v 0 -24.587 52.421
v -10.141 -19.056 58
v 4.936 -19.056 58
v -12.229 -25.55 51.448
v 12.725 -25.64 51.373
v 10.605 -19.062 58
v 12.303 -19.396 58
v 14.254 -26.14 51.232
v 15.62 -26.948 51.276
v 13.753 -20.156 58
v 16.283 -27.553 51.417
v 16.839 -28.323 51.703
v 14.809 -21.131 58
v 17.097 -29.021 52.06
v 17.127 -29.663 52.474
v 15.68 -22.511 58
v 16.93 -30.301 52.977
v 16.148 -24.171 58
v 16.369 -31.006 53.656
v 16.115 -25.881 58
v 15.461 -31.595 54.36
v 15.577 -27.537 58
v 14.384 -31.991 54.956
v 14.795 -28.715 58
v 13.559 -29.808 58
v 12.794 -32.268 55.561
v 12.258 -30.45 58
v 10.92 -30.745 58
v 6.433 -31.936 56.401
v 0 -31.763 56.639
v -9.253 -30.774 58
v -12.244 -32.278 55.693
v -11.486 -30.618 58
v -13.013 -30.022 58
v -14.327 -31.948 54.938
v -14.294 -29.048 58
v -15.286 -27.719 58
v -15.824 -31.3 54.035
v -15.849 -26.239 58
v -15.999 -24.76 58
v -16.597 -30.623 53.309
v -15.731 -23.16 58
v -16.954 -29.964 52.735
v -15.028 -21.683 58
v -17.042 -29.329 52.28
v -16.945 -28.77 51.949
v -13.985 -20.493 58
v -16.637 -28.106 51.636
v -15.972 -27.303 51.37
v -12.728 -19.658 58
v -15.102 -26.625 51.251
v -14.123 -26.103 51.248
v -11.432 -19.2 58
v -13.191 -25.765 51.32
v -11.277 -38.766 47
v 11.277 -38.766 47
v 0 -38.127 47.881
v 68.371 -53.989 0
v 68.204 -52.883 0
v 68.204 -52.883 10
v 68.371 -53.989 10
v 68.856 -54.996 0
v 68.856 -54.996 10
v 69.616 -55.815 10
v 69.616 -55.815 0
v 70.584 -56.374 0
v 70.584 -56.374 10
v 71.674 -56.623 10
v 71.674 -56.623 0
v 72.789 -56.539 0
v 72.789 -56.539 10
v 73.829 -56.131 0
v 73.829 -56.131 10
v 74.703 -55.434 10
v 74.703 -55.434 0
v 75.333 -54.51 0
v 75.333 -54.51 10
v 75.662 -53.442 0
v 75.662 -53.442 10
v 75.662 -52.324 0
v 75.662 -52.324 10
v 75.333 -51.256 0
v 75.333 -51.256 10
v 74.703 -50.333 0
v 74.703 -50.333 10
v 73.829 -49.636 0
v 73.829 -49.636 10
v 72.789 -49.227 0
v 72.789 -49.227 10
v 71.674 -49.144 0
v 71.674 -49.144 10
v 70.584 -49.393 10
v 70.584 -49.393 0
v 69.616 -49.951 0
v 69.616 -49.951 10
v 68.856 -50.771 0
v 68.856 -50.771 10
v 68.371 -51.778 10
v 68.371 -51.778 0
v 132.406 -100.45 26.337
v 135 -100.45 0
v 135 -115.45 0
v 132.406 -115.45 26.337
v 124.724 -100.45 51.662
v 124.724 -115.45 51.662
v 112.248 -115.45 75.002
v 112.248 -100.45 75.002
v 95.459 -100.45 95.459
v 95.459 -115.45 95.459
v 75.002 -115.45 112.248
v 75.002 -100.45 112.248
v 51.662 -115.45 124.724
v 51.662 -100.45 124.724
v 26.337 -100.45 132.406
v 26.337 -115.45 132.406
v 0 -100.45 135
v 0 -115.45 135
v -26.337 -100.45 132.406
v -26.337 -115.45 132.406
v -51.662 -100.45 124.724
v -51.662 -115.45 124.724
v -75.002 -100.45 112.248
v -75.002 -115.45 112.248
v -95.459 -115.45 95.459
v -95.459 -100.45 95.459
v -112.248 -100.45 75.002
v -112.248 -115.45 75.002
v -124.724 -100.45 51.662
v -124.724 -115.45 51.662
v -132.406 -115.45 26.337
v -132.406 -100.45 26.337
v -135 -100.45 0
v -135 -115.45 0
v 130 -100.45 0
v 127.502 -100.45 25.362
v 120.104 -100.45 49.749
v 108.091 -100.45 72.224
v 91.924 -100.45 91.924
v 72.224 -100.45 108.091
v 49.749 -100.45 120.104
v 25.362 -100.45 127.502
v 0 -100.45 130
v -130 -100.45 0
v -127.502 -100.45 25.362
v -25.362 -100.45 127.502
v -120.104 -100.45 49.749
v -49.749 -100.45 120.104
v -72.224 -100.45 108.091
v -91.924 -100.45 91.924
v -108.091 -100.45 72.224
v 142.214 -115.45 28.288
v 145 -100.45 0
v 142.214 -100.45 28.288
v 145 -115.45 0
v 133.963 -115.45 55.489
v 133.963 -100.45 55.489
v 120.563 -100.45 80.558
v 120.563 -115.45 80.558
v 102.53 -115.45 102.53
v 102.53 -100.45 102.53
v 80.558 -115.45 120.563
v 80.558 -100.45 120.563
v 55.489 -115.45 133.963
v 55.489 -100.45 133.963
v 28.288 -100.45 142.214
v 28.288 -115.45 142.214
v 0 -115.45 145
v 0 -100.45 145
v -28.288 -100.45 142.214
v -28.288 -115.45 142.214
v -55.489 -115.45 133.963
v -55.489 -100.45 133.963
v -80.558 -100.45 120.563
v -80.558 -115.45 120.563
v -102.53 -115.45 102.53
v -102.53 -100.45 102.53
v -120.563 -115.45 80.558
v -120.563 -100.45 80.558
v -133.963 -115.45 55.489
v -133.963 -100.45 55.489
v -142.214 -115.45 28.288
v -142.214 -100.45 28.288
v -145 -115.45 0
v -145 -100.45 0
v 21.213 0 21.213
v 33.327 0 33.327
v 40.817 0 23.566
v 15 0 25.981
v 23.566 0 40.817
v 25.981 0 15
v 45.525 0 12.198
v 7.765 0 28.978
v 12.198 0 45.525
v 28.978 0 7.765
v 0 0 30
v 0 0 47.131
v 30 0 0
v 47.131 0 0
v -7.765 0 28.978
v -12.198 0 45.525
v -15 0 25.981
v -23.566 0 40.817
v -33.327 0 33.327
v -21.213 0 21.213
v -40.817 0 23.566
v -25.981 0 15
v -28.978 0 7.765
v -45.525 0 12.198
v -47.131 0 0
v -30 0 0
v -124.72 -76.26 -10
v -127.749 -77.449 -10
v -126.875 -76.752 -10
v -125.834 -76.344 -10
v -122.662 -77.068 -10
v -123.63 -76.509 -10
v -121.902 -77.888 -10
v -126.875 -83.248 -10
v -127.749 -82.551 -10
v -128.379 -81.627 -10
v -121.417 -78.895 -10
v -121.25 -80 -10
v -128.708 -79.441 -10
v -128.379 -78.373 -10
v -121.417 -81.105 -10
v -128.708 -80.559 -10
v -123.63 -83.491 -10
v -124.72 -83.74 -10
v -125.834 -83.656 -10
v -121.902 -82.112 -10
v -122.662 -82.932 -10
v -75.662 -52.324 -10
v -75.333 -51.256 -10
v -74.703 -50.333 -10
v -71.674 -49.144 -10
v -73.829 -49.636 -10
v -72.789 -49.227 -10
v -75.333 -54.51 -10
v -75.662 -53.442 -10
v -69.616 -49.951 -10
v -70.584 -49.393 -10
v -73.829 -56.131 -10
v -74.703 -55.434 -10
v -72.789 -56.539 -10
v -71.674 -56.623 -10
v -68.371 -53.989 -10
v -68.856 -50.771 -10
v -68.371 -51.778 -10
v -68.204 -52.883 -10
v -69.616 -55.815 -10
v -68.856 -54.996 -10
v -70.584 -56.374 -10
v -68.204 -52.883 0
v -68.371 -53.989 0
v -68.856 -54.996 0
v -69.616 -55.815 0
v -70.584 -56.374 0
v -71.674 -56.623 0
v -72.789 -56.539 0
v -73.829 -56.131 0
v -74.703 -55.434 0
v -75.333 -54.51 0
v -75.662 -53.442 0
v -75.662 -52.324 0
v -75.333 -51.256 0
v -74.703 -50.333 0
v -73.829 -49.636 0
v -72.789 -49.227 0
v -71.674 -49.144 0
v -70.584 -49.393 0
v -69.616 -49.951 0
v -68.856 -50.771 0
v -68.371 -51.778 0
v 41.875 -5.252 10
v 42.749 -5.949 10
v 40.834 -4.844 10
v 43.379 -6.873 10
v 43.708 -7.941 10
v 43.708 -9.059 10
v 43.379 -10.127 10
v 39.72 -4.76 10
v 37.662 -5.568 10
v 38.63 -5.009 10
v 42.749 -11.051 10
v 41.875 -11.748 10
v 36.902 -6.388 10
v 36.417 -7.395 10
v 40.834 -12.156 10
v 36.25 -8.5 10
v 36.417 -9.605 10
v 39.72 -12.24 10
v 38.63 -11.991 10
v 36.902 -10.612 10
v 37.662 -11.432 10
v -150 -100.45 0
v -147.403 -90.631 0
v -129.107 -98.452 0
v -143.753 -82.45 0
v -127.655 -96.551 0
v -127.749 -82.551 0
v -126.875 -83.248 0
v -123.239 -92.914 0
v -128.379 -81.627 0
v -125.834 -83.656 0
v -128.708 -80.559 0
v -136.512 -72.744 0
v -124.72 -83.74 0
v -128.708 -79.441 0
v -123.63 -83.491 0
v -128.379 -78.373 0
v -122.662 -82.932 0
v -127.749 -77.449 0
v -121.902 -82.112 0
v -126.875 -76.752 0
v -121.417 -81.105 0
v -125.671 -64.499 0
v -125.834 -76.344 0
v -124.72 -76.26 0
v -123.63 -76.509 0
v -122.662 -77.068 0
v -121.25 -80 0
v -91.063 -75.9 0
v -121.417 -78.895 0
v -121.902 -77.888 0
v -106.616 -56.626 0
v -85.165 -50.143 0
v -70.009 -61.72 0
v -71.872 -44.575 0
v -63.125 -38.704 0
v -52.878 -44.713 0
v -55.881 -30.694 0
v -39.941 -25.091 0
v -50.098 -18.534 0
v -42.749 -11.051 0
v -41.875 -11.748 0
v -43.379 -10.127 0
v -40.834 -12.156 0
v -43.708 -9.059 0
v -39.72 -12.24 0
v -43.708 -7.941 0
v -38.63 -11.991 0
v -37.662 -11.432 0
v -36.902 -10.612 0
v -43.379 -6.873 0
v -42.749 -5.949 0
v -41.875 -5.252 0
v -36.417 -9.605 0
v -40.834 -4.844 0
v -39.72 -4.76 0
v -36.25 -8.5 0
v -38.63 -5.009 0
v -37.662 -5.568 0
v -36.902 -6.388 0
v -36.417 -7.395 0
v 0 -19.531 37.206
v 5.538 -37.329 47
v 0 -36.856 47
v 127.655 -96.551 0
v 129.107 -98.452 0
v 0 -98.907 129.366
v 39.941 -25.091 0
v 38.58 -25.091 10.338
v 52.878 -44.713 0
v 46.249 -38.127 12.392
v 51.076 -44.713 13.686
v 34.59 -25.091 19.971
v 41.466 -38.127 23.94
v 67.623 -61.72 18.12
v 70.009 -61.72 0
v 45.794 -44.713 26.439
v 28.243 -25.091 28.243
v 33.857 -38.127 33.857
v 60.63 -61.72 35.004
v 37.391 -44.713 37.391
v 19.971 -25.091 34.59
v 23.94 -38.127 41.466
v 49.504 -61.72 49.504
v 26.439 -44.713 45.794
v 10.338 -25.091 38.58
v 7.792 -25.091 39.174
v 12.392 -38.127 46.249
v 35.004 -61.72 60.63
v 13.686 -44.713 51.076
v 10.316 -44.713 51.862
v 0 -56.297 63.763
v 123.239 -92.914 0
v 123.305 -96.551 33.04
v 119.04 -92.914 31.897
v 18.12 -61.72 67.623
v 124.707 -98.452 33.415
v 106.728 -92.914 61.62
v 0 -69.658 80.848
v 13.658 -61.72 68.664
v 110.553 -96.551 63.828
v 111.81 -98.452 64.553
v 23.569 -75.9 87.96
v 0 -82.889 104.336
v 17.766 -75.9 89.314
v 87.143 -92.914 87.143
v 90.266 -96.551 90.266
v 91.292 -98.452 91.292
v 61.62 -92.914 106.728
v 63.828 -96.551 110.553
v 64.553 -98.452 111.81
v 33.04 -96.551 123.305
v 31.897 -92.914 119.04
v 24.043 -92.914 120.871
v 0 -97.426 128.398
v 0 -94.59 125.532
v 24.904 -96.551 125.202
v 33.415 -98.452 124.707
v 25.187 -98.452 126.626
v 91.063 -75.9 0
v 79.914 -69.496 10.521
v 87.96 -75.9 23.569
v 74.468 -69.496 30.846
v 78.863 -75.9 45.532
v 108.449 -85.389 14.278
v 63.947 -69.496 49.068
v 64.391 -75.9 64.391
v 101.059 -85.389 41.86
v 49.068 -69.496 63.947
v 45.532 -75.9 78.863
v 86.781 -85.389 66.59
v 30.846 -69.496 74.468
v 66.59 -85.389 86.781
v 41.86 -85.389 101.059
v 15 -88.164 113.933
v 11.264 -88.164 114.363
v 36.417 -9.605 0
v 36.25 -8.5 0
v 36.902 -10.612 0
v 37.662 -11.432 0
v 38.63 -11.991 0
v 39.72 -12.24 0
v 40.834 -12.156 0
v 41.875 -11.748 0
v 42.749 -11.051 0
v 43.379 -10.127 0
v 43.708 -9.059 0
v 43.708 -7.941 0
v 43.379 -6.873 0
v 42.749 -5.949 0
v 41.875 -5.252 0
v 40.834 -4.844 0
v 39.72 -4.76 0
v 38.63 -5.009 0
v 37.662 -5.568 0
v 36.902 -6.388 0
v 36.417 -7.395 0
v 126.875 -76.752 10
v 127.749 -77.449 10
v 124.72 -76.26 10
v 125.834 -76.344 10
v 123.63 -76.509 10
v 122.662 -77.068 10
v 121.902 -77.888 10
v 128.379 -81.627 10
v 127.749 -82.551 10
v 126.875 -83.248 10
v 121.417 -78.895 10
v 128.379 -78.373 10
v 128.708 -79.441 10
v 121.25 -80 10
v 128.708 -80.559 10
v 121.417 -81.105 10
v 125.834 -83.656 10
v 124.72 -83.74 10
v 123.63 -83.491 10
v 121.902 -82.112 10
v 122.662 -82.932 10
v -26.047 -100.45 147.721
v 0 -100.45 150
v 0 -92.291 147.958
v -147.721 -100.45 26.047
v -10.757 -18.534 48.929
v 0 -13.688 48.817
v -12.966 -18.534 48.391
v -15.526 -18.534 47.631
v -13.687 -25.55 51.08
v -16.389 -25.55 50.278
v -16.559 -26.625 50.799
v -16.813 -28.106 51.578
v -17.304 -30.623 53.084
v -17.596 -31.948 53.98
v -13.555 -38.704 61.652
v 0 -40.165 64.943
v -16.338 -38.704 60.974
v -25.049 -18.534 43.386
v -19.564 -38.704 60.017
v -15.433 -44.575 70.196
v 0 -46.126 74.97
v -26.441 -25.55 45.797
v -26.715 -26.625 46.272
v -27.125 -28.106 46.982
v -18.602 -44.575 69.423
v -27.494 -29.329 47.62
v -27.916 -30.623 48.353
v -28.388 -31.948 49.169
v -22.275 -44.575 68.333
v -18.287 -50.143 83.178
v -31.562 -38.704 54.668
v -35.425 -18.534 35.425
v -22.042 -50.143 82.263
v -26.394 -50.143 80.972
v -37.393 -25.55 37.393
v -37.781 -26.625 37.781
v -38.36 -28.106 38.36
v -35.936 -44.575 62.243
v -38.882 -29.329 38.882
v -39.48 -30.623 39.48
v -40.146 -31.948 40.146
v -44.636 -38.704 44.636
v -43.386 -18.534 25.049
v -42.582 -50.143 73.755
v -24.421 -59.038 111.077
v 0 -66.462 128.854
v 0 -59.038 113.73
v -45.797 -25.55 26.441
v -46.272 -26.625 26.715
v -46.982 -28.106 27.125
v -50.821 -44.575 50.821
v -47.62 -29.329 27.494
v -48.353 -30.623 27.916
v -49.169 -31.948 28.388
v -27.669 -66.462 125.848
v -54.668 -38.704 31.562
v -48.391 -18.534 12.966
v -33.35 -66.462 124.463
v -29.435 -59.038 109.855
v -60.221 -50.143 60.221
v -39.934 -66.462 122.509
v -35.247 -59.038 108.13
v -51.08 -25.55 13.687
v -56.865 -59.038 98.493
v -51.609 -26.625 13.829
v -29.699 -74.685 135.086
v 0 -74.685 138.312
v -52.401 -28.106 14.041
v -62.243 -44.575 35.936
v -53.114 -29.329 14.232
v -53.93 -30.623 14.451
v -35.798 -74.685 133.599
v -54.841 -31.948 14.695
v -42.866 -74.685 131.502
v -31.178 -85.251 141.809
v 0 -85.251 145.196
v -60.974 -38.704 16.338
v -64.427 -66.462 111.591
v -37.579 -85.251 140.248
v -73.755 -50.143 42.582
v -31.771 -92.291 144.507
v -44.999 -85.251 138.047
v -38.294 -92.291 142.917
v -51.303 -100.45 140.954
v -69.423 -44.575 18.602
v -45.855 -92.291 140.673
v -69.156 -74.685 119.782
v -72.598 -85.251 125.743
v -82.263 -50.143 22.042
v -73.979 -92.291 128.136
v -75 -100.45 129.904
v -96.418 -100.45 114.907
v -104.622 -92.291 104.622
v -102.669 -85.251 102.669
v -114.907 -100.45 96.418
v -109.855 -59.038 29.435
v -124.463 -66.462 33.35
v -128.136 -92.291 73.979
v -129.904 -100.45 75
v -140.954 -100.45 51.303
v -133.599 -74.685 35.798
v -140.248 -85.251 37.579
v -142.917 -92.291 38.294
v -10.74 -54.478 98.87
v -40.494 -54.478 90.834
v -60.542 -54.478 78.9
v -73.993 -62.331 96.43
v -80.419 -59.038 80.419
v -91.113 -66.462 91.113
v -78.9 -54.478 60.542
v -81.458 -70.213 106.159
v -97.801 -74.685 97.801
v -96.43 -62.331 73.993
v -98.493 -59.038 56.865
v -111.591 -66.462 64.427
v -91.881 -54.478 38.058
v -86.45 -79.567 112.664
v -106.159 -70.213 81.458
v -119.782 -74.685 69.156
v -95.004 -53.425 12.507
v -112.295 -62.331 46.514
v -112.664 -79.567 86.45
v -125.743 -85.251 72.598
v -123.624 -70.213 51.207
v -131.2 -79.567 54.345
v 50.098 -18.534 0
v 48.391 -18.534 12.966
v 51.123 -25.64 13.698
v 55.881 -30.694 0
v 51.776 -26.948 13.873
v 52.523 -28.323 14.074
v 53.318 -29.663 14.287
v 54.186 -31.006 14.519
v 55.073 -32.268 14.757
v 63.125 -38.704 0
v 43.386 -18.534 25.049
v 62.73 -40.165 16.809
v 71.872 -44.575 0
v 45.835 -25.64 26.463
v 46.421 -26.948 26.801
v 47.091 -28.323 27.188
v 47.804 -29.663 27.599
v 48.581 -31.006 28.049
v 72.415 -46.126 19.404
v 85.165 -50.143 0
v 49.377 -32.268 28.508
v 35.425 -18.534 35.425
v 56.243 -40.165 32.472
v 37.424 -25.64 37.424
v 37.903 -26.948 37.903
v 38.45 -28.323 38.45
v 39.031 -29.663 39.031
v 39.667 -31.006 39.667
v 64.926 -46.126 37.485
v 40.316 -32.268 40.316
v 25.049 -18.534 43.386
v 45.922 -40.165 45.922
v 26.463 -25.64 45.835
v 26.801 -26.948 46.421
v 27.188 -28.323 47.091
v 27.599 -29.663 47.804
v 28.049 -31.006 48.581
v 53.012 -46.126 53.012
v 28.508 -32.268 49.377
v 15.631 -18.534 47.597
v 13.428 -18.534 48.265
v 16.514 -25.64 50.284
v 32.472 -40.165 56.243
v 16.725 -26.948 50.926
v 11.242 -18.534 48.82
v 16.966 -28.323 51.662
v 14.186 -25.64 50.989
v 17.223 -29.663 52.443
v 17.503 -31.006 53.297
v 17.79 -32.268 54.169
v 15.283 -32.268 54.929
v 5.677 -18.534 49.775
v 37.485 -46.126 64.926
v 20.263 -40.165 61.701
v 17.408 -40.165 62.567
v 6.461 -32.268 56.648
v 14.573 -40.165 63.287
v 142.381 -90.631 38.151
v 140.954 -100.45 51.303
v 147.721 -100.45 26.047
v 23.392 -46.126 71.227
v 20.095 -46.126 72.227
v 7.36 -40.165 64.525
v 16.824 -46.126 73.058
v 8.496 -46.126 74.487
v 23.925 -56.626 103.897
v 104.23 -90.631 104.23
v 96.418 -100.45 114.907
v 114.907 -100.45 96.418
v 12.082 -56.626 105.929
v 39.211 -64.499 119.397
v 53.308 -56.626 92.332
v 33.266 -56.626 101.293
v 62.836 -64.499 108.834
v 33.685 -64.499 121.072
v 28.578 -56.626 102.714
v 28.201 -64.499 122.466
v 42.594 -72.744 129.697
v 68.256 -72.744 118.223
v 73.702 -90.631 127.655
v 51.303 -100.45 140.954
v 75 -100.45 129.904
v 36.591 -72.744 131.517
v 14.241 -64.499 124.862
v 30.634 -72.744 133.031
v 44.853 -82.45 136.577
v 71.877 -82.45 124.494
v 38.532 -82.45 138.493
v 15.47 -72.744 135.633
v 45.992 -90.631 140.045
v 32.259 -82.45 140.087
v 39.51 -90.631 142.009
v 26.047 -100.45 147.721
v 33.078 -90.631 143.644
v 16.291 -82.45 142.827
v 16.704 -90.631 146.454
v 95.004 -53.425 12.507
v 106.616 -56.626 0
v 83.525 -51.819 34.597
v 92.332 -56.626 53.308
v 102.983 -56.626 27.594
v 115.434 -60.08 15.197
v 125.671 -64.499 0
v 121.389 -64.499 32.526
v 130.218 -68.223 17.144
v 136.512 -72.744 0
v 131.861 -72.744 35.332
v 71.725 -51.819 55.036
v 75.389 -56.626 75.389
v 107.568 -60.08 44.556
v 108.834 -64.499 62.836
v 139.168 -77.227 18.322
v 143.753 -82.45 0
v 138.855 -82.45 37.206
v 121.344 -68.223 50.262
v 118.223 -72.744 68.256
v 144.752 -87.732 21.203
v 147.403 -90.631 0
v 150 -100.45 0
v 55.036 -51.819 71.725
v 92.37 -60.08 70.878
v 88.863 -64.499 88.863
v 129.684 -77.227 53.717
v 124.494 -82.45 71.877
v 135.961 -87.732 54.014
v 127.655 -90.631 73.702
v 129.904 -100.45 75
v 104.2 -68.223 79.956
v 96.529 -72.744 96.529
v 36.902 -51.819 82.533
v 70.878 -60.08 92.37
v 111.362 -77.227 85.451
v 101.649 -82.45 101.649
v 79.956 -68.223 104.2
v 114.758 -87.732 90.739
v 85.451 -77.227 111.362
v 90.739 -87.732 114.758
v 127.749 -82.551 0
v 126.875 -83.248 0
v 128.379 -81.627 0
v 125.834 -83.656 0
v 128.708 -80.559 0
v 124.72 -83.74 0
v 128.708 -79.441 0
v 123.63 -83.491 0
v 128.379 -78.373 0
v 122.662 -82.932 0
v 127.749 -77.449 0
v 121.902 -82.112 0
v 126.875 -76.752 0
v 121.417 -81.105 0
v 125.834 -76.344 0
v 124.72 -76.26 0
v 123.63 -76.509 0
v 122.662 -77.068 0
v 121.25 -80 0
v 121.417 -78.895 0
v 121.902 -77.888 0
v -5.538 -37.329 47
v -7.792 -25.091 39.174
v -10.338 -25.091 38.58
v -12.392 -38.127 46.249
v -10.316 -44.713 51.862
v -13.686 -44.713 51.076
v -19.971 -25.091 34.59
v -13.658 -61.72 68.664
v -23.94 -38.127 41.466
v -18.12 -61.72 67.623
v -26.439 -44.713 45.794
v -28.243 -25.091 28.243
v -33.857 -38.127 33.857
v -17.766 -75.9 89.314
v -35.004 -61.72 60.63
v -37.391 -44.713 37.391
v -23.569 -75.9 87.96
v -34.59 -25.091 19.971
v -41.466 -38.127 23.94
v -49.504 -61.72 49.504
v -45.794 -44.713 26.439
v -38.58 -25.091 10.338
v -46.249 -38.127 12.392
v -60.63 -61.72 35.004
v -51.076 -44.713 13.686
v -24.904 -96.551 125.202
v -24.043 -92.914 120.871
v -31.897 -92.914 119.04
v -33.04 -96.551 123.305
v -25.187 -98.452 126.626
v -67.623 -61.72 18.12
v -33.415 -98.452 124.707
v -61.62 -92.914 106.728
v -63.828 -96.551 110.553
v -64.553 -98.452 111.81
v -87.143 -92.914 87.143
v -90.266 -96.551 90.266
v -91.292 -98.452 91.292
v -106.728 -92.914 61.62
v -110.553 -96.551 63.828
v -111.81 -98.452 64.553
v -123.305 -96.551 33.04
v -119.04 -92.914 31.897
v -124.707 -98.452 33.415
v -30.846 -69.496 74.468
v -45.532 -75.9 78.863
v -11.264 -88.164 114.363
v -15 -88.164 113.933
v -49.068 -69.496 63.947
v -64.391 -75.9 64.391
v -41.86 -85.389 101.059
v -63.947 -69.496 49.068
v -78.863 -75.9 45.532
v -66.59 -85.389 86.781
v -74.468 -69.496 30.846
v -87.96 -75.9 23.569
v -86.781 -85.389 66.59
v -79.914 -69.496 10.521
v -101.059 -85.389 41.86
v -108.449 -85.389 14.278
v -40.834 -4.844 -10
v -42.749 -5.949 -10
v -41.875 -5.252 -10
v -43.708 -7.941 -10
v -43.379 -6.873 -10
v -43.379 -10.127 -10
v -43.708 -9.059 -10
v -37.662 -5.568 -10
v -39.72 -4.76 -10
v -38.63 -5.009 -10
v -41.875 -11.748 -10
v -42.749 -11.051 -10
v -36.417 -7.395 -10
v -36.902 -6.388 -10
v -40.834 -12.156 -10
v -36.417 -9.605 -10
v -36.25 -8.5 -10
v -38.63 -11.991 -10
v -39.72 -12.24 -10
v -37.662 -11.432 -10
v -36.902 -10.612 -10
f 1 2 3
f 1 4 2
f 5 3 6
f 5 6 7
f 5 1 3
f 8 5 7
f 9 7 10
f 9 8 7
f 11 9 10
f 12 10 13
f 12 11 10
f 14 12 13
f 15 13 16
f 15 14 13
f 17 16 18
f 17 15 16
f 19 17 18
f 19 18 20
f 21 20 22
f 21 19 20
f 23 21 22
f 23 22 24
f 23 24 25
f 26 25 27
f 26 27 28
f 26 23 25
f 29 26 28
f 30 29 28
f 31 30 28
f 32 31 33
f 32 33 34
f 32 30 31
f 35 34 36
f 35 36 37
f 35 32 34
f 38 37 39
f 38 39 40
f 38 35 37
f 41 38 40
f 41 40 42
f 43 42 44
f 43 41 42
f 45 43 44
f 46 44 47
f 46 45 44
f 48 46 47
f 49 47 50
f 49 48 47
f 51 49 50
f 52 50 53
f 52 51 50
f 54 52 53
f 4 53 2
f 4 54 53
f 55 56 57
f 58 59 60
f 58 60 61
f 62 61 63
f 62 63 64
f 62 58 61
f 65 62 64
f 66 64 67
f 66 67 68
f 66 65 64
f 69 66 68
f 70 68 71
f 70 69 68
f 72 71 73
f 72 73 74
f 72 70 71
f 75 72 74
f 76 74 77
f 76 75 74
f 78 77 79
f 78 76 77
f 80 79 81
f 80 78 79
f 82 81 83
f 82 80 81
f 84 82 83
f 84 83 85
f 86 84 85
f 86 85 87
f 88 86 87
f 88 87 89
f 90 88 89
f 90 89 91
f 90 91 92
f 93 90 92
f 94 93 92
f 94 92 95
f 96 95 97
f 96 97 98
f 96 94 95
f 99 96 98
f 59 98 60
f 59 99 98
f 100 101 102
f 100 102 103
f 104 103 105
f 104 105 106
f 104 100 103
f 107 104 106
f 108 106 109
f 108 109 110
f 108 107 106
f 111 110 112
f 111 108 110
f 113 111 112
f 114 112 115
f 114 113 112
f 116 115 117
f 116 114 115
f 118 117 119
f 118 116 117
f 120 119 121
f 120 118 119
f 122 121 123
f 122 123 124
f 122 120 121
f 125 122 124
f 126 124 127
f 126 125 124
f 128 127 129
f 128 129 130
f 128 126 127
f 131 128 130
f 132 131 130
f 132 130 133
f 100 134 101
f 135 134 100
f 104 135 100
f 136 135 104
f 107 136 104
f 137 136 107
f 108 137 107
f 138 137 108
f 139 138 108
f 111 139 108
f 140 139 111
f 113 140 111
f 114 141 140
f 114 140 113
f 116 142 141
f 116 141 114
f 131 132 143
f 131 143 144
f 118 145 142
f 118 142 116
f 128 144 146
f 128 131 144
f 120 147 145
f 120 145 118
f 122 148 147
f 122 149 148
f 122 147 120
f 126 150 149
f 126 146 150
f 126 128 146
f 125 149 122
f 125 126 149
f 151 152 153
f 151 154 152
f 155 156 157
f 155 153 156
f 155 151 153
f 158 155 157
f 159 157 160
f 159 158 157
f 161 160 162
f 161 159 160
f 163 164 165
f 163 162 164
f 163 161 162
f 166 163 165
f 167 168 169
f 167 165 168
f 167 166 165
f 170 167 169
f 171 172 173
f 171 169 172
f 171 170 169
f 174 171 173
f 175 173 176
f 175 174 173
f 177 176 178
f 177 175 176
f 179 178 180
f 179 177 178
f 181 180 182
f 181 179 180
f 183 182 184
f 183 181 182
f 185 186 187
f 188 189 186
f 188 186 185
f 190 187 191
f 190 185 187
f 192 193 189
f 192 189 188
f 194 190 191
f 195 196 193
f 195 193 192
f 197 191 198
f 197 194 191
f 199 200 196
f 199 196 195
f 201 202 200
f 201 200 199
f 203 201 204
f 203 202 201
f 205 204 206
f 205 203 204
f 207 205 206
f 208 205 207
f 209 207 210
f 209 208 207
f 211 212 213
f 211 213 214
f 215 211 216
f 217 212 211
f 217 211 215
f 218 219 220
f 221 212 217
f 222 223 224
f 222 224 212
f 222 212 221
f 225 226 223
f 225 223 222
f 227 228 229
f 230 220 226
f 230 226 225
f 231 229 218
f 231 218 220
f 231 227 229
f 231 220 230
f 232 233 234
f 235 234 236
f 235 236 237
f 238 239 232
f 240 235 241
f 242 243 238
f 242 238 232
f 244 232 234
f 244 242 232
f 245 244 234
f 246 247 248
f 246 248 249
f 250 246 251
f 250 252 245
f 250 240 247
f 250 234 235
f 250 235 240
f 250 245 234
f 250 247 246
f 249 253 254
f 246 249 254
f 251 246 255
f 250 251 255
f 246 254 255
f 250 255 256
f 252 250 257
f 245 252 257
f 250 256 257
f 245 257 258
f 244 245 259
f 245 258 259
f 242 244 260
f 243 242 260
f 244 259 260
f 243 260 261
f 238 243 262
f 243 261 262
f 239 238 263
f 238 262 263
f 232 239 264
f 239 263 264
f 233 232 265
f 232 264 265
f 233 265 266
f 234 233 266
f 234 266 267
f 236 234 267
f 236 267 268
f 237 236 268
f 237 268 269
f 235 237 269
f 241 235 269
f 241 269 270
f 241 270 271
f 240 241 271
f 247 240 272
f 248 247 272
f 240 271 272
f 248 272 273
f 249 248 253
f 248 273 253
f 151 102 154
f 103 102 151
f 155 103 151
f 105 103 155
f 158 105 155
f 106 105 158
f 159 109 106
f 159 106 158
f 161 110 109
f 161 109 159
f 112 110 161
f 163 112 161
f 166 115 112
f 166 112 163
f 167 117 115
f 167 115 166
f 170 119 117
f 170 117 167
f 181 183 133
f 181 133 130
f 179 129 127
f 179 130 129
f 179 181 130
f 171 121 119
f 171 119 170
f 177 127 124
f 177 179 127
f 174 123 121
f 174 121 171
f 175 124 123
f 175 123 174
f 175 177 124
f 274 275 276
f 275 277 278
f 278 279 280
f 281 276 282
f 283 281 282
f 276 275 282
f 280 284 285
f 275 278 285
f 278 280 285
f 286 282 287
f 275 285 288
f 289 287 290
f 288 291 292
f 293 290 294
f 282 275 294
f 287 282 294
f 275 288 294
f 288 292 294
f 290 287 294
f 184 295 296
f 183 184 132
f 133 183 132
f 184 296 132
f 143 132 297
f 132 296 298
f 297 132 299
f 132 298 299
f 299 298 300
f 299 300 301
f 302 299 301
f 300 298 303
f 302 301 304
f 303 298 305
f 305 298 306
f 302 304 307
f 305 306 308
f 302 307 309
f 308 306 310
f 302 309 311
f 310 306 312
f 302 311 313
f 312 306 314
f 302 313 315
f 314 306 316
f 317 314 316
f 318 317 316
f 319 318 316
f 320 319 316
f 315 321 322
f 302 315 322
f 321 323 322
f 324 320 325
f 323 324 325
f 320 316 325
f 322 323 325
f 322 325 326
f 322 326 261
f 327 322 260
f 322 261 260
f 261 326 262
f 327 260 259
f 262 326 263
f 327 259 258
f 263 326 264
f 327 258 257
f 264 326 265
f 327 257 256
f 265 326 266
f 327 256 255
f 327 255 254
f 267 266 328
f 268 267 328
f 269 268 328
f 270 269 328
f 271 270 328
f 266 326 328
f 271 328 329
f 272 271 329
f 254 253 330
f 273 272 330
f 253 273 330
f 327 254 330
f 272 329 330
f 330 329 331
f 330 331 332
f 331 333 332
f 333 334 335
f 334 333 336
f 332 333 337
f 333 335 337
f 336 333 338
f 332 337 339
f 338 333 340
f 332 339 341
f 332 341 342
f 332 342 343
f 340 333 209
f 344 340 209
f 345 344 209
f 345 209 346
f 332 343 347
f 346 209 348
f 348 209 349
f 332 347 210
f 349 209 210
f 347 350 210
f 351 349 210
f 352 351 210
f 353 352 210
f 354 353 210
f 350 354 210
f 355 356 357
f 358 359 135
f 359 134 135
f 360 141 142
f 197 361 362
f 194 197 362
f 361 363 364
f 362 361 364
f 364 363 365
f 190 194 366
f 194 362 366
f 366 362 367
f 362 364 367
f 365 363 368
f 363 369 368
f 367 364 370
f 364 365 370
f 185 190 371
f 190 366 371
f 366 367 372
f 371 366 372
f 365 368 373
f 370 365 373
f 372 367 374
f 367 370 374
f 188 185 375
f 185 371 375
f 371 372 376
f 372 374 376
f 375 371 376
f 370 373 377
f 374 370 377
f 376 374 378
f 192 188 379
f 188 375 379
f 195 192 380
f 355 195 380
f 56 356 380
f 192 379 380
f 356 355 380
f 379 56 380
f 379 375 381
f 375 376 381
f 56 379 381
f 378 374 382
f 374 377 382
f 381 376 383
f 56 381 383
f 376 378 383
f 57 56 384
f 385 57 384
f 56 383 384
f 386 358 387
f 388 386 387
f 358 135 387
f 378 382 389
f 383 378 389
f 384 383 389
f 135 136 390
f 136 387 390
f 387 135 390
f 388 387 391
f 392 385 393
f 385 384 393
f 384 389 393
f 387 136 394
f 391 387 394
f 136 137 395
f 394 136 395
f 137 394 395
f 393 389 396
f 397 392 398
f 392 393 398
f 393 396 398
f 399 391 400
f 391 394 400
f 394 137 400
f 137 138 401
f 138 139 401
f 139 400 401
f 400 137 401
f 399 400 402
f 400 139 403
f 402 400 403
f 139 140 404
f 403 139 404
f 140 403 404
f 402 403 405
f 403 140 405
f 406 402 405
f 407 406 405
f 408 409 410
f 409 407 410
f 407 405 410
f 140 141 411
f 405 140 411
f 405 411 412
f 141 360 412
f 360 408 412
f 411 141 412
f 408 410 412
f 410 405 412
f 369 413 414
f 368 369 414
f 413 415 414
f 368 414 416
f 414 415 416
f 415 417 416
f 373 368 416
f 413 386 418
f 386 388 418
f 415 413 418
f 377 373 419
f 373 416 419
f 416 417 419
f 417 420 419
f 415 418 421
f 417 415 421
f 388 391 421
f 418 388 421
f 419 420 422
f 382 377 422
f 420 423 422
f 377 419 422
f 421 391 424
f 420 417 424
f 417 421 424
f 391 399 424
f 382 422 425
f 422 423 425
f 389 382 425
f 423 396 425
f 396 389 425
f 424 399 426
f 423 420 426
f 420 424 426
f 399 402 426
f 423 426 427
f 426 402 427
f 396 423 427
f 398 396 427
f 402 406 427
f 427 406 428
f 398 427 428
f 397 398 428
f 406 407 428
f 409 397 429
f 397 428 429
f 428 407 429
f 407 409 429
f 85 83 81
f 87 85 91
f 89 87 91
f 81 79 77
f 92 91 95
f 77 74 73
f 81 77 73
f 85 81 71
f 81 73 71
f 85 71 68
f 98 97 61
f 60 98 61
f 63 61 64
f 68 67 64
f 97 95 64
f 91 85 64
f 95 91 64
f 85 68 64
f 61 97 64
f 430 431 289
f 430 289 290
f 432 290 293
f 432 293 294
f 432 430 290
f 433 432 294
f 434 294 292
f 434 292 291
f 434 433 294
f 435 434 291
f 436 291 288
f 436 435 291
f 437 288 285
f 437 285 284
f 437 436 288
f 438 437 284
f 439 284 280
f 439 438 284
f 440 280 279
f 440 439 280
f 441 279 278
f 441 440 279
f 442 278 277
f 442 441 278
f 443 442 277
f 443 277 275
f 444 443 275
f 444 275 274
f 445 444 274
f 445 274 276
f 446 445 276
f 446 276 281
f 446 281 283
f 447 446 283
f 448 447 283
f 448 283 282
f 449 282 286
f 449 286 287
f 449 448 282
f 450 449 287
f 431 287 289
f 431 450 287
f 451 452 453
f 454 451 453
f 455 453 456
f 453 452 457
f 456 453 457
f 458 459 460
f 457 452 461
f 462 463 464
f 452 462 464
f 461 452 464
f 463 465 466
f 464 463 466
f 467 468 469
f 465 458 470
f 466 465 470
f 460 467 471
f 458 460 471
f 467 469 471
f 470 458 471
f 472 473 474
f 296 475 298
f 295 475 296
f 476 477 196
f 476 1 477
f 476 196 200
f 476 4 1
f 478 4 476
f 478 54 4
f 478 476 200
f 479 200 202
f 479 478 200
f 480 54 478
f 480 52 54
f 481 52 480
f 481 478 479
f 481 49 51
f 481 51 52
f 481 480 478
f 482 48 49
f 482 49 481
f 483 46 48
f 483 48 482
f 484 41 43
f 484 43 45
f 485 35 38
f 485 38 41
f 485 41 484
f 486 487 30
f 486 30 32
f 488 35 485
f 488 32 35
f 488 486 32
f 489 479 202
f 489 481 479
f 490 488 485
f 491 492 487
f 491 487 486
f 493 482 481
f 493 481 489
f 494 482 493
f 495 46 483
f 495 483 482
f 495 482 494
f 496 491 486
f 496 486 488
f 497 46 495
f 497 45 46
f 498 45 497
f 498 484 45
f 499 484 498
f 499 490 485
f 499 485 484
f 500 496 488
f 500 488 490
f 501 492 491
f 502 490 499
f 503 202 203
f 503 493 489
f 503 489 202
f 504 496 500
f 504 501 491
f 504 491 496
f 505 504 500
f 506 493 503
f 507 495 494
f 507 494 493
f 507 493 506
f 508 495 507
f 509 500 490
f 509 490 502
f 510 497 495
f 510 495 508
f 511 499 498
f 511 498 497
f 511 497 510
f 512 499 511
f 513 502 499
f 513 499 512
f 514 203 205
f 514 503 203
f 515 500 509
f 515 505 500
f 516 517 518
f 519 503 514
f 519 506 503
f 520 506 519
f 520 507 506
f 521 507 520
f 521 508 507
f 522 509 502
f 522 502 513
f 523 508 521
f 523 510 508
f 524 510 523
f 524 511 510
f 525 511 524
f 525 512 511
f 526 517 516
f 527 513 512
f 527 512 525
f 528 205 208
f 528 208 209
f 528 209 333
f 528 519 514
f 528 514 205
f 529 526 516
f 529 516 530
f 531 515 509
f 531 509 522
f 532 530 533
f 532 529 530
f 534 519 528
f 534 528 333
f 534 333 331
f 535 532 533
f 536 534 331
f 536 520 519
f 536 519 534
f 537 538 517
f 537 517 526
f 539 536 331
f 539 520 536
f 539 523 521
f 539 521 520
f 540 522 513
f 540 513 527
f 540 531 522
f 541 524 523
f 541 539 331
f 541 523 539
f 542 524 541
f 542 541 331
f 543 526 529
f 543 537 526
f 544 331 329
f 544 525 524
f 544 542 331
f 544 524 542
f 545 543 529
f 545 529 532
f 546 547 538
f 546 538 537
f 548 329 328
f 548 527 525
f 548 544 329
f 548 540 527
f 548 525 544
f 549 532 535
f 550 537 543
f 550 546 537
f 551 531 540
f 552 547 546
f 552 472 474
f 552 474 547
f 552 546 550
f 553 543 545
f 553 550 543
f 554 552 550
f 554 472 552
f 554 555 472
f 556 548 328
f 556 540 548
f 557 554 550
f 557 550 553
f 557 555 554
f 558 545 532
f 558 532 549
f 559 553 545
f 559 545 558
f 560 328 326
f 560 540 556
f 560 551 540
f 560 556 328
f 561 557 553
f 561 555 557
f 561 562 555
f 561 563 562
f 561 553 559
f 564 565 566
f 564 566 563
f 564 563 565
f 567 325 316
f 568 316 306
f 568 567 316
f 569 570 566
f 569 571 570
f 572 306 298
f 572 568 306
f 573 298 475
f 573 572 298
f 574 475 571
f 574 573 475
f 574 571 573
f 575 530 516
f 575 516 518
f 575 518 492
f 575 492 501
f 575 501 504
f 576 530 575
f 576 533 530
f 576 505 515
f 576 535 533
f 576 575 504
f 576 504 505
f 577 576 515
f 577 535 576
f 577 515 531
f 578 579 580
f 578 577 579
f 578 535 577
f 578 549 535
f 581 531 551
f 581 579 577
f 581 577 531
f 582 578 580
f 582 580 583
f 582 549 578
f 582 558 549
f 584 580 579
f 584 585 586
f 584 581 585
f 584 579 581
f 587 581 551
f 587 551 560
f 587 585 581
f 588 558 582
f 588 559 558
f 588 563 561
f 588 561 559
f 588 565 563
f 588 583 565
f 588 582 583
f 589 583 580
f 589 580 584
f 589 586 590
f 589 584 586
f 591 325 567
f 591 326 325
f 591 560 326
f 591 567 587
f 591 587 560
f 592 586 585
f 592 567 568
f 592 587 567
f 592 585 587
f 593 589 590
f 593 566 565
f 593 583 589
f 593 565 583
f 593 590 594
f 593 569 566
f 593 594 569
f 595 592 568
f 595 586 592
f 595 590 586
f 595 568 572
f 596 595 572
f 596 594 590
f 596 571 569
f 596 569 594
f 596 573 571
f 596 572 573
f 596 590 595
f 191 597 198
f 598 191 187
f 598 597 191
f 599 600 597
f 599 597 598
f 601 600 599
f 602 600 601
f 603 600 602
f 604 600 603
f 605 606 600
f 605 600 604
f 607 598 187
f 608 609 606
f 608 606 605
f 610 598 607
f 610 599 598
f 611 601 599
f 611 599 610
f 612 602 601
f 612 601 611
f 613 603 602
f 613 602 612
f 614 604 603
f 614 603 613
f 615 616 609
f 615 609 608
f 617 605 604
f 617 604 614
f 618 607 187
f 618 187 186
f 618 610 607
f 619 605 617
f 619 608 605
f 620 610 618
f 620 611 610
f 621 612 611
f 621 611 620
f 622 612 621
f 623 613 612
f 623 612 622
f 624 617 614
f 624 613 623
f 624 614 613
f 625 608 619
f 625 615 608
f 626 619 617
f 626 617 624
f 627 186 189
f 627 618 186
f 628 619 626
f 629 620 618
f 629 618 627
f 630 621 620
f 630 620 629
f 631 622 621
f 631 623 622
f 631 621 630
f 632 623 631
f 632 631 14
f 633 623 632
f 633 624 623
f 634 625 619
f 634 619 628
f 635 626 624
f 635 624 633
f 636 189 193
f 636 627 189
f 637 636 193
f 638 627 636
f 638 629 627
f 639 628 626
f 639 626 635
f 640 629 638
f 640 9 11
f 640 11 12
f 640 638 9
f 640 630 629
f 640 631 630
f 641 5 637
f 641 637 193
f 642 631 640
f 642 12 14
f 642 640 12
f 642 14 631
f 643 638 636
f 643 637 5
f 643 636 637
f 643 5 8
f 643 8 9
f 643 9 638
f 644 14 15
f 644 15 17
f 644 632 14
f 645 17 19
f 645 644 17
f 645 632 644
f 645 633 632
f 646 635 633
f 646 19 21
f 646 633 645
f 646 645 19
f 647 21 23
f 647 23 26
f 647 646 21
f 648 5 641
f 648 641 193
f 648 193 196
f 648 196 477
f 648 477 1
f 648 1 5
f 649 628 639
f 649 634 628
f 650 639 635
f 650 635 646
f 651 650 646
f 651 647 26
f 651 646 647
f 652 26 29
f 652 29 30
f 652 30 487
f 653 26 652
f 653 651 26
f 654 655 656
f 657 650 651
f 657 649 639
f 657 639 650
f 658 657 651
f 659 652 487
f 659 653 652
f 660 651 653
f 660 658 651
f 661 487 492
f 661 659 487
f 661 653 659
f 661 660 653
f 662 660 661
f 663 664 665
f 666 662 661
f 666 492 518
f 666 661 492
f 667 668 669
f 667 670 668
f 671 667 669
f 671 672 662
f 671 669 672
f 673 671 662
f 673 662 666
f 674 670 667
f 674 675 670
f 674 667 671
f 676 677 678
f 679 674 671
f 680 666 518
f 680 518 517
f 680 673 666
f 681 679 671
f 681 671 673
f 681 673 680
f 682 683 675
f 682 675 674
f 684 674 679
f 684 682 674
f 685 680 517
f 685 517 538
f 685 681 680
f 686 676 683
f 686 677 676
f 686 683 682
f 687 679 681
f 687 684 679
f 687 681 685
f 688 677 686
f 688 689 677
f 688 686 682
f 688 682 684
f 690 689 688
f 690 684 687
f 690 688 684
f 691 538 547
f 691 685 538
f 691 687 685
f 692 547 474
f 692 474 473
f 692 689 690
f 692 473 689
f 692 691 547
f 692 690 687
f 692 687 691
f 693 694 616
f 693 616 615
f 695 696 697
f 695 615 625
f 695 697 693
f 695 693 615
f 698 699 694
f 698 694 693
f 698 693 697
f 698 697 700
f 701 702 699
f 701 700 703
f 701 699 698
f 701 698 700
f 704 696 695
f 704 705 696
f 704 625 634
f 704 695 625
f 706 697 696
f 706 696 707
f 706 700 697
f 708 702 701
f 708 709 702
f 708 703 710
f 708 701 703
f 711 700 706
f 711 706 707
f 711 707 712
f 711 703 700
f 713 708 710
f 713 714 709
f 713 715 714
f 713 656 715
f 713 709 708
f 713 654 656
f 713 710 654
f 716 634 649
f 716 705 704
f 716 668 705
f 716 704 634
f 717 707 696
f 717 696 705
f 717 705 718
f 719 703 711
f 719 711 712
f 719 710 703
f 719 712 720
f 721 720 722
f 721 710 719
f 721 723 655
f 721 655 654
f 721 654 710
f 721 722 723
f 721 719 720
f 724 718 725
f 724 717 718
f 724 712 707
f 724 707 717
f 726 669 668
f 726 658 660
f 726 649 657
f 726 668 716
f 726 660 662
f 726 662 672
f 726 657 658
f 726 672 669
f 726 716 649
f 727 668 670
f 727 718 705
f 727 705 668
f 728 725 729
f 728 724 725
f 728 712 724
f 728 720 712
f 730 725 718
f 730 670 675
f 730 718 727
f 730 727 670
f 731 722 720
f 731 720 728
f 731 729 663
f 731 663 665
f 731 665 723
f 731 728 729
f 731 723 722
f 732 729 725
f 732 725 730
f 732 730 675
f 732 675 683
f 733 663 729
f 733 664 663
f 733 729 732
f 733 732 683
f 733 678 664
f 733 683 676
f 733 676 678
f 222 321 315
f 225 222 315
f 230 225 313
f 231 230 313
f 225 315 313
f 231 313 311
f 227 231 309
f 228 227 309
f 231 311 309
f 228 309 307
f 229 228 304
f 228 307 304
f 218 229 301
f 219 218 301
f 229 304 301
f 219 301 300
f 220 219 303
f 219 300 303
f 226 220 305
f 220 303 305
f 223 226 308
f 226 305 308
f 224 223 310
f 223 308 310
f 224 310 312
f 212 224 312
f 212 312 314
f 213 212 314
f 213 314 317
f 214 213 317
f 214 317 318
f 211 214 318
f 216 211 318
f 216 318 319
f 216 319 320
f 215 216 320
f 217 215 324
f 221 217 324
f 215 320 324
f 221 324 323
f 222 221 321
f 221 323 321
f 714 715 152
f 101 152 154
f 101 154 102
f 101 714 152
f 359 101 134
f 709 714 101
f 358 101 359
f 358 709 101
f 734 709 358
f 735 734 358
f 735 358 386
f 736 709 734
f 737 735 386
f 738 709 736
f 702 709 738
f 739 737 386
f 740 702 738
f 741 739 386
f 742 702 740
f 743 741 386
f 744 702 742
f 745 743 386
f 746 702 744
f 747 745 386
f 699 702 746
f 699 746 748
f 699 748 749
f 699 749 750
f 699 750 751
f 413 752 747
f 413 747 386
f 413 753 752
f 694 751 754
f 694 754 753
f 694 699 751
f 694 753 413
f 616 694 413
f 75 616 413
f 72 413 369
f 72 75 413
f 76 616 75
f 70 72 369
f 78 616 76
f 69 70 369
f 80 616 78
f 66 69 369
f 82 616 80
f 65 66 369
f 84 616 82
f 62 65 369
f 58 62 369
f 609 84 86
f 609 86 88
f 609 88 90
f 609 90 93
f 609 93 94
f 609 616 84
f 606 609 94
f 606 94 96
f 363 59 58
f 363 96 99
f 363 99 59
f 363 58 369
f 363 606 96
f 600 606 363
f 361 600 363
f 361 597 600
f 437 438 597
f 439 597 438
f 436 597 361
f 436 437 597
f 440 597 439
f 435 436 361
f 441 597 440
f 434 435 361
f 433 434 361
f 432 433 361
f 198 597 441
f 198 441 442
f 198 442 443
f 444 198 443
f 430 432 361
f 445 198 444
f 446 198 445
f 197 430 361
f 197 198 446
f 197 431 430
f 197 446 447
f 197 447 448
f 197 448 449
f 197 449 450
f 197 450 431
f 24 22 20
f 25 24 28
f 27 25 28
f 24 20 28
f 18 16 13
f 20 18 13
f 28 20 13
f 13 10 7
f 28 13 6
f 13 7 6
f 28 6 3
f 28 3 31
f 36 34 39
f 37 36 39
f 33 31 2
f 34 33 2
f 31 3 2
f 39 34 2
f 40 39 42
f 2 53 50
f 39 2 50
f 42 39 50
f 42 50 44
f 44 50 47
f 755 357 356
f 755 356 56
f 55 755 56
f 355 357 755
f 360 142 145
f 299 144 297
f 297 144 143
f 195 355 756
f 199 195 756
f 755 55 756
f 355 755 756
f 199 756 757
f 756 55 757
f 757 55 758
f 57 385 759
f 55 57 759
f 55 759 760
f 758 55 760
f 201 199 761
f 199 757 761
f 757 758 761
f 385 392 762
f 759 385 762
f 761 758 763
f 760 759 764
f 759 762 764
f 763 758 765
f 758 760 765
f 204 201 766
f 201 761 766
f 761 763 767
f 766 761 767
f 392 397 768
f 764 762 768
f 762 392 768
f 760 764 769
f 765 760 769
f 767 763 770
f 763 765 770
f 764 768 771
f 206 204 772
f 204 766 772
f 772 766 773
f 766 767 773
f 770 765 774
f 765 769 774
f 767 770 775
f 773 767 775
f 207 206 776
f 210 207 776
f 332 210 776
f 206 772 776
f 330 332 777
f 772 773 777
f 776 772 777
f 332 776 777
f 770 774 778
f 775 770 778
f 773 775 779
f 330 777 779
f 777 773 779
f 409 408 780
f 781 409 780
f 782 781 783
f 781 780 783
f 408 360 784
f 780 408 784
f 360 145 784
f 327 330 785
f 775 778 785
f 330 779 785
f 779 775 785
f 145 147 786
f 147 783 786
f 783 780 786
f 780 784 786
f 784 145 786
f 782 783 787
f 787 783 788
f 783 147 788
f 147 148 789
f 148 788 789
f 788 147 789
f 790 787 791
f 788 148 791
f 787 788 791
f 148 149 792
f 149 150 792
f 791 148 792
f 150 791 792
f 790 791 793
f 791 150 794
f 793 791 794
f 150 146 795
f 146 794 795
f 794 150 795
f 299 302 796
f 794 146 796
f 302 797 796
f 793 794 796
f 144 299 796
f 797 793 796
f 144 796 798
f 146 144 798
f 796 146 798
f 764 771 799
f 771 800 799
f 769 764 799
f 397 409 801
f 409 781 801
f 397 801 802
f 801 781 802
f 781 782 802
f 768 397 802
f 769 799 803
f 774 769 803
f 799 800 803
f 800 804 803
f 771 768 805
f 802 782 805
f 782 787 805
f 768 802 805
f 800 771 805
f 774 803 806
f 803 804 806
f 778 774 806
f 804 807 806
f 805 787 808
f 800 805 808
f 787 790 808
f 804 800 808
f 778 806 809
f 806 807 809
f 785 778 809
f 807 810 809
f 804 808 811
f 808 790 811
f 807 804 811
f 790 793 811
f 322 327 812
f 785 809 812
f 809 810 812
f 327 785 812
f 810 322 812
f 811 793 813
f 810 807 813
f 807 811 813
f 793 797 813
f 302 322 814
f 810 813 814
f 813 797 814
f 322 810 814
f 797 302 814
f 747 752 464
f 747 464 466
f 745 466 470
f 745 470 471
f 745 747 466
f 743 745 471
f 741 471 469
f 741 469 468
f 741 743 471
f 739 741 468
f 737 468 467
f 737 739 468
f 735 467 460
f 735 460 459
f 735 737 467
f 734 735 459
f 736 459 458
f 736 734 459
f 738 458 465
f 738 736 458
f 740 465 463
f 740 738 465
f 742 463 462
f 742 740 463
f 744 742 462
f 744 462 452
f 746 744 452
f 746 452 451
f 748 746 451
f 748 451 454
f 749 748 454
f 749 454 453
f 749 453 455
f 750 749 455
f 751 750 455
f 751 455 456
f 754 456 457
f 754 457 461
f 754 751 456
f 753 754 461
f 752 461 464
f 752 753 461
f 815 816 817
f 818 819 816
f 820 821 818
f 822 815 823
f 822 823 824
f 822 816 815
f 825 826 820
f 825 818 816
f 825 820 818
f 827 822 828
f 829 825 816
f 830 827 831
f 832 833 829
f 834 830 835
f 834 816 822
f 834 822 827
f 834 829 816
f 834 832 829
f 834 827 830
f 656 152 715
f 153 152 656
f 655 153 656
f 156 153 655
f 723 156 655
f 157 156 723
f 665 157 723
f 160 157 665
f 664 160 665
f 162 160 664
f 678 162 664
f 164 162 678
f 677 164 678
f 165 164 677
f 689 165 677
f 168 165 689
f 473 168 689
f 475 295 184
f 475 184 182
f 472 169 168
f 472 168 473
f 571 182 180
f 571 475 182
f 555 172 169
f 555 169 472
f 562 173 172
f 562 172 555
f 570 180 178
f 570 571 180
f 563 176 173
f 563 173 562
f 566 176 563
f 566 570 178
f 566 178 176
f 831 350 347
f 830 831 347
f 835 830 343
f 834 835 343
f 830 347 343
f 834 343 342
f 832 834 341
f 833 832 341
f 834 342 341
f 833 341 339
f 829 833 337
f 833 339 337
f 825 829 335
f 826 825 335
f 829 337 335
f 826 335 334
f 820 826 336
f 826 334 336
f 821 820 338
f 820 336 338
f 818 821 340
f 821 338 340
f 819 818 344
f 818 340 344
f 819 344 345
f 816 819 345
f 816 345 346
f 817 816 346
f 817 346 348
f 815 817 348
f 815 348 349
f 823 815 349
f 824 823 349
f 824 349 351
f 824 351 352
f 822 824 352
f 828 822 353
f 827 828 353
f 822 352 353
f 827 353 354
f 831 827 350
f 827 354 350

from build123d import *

# Parameters (mm, degrees)
R_VOLUTION1_ANGLE            = 90
ESQUISSE6_R                  = 3.75
BOSS_EXTRU_1_DEPTH           = 10
R_P_TITION_CIRCULAIRE2_COUNT = 2
R_P_TITION_CIRCULAIRE2_ANGLE = 270
R_P_TITION_CIRCULAIRE3_COUNT = 2
R_P_TITION_CIRCULAIRE3_ANGLE = 90


with BuildPart() as part:
    # Esquisse2 → Révolution1 (revolve)
    with BuildSketch(Plane.XY):
        with BuildLine():
            Line((30, 0), (47.131260288, 0))
            add(Edge.make_bspline(
                [(47.131260288, 0), (50.337430192, -76.684539626), (136.959304806, -31.563871951), (150, -100.45024926)],
                knots=[0, 0, 0, 0, 1, 1, 1, 1], degree=3))
            Line((150, -100.45024926), (145, -100.45024926))
            Line((145, -100.45024926), (145, -115.45024926))
            Line((145, -115.45024926), (135, -115.45024926))
            Line((135, -115.45024926), (135, -100.45024926))
            Line((135, -100.45024926), (130, -100.45024926))
            add(Edge.make_bspline(
                [(30, 0), (52.696130576, -79.217712587), (124.807660959, -82.686229226), (130, -100.45024926)],
                knots=[0, 0, 0, 0, 1, 1, 1, 1], degree=3))
        make_face()
    revolve(axis=Axis((0, 55, 0), (0, -1, 0)), revolution_arc=R_VOLUTION1_ANGLE)

    # Esquisse6 → Boss.-Extru.1 (add)
    with BuildSketch(Plane.ZY):
        with Locations(Location((40, -8.5, 0), (0, 0, 180))):
            Circle(ESQUISSE6_R)
        with Locations(Location((71.95431642, -52.883306602, 0), (0, 0, 180))):
            Circle(ESQUISSE6_R)
        with Locations(Location((125, -80, 0), (0, 0, 180))):
            Circle(ESQUISSE6_R)
    extrude(amount=BOSS_EXTRU_1_DEPTH)


with BuildPart() as r_p_tition_circulaire2_1:
    # Répétition circulaire2: pattern copy
    add(part.part.rotate(Axis((0, 55, 0), (0, -1, 0)), 1 * R_P_TITION_CIRCULAIRE2_ANGLE / (R_P_TITION_CIRCULAIRE2_COUNT - 1)))


with BuildPart() as part_1:
    add(part.part)

    # Combiner3: cut Répétition circulaire2_1
    add(r_p_tition_circulaire2_1.part, mode=Mode.SUBTRACT)


with BuildPart() as r_p_tition_circulaire3_1:
    # Répétition circulaire3: pattern copy
    add(part_1.part.rotate(Axis((0, 55, 0), (0, -1, 0)), 1 * R_P_TITION_CIRCULAIRE3_ANGLE / (R_P_TITION_CIRCULAIRE3_COUNT - 1)))


with BuildPart() as part_2:
    add(part_1.part)

    # Combiner4: union Répétition circulaire3_1
    add(r_p_tition_circulaire3_1.part)

    # Lissage2: read off the stored shape, not the designer's step
    # Lissage2: loft between two sections, ruled curve by curve
    lissage2_from = [
        Edge.make_bspline([(-10.141415638, -19.056019087, 58), (-8.212976489, -19.056019087, 58), (-4.745525631, -19.056019087, 58), (0.097340365, -19.056019087, 58), (4.940206361, -19.056019087, 58), (8.407657219, -19.056019087, 58), (10.992070669, -19.056019087, 58), (12.368530298, -19.277794454, 58), (14.347229759, -20.43033769, 58), (15.825485799, -22.4031348, 58), (16.381152507, -24.915194071, 58), (15.825485799, -27.427253342, 58), (14.347229759, -29.400050453, 58), (12.368530298, -30.552593688, 58), (10.992070669, -30.774369055, 58), (8.407657219, -30.774369055, 58), (4.940206361, -30.774369055, 58), (0.097340365, -30.774369055, 58), (-4.745525631, -30.774369055, 58), (-8.212976489, -30.774369055, 58), (-10.797389939, -30.774369055, 58), (-12.173849568, -30.552593688, 58), (-14.152549029, -29.400050453, 58), (-15.630805069, -27.427253342, 58), (-16.186471777, -24.915194071, 58), (-15.630805069, -22.4031348, 58), (-14.152549029, -20.43033769, 58), (-12.173849568, -19.277794454, 58), (-10.797389939, -19.056019087, 58), (-10.141415638, -19.056019087, 58)], [0, 0, 0, 0, 0.074390756, 0.148781511, 0.223172267, 0.297563023, 0.297563023, 0.322867645, 0.348172267, 0.373476889, 0.398781511, 0.424086134, 0.449390756, 0.474695378, 0.5, 0.5, 0.574390756, 0.648781511, 0.723172267, 0.797563023, 0.797563023, 0.822867645, 0.848172267, 0.873476889, 0.898781511, 0.924086134, 0.949390756, 0.974695378, 1, 1, 1, 1], 3),
    ]
    lissage2_to = [
        Edge.make_bspline([(-13.646593818, -29.959479994, 47), (-11.606942776, -29.959479994, 47), (-7.235758652, -29.959479994, 47), (0, -29.959479994, 47), (7.235758652, -29.959479994, 47), (11.606942776, -29.959479994, 47), (14.340397752, -29.959479994, 47), (15.598489603, -30.279278409, 47), (16.997996562, -31.3442136, 47), (17.857241012, -32.768726587, 47), (18.146490081, -34.362953291, 47), (17.857241012, -35.957179995, 47), (16.997996562, -37.381692982, 47), (15.598489603, -38.446628173, 47), (14.340397752, -38.766426588, 47), (11.606942776, -38.766426588, 47), (7.235758652, -38.766426588, 47), (0, -38.766426588, 47), (-7.235758652, -38.766426588, 47), (-11.606942776, -38.766426588, 47), (-14.340397752, -38.766426588, 47), (-15.598489603, -38.446628173, 47), (-16.997996562, -37.381692982, 47), (-17.857241012, -35.957179995, 47), (-18.146490081, -34.362953291, 47), (-17.857241012, -32.768726587, 47), (-16.997996562, -31.3442136, 47), (-15.598489603, -30.279278409, 47), (-14.340397752, -29.959479994, 47), (-13.646593818, -29.959479994, 47)], [0, 0, 0, 0, 0.074390756, 0.148781511, 0.223172267, 0.297563023, 0.297563023, 0.322867645, 0.348172267, 0.373476889, 0.398781511, 0.424086134, 0.449390756, 0.474695378, 0.5, 0.5, 0.574390756, 0.648781511, 0.723172267, 0.797563023, 0.797563023, 0.822867645, 0.848172267, 0.873476889, 0.898781511, 0.924086134, 0.949390756, 0.974695378, 1, 1, 1, 1], 3),
    ]
    lissage2 = Solid(Shell([*[Face.make_surface_from_curves(lissage2_from[k], lissage2_to[k]) for k in range(1)], Face(Wire(lissage2_from)), Face(Wire(lissage2_to))]))
    add(lissage2)

    # Lissage2 2: loft between two sections, ruled curve by curve
    lissage2_2_from = [
        Edge.make_bspline([(-10.141415638, -19.056019087, 58), (-8.212976489, -19.056019087, 58), (-4.745525631, -19.056019087, 58), (0.097340365, -19.056019087, 58), (4.940206361, -19.056019087, 58), (8.407657219, -19.056019087, 58), (10.992070669, -19.056019087, 58), (12.368530298, -19.277794454, 58), (14.347229759, -20.43033769, 58), (15.825485799, -22.4031348, 58), (16.381152507, -24.915194071, 58), (15.825485799, -27.427253342, 58), (14.347229759, -29.400050453, 58), (12.368530298, -30.552593688, 58), (10.992070669, -30.774369055, 58), (8.407657219, -30.774369055, 58), (4.940206361, -30.774369055, 58), (0.097340365, -30.774369055, 58), (-4.745525631, -30.774369055, 58), (-8.212976489, -30.774369055, 58), (-10.797389939, -30.774369055, 58), (-12.173849568, -30.552593688, 58), (-14.152549029, -29.400050453, 58), (-15.630805069, -27.427253342, 58), (-16.186471777, -24.915194071, 58), (-15.630805069, -22.4031348, 58), (-14.152549029, -20.43033769, 58), (-12.173849568, -19.277794454, 58), (-10.797389939, -19.056019087, 58), (-10.141415638, -19.056019087, 58)], [0, 0, 0, 0, 0.074390756, 0.148781511, 0.223172267, 0.297563023, 0.297563023, 0.322867645, 0.348172267, 0.373476889, 0.398781511, 0.424086134, 0.449390756, 0.474695378, 0.5, 0.5, 0.574390756, 0.648781511, 0.723172267, 0.797563023, 0.797563023, 0.822867645, 0.848172267, 0.873476889, 0.898781511, 0.924086134, 0.949390756, 0.974695378, 1, 1, 1, 1], 3),
    ]
    lissage2_2_to = [
        Edge.make_bspline([(-13.646593818, -29.959479994, 47), (-11.606942776, -29.959479994, 47), (-7.235758652, -29.959479994, 47), (0, -29.959479994, 47), (7.235758652, -29.959479994, 47), (11.606942776, -29.959479994, 47), (14.340397752, -29.959479994, 47), (15.598489603, -30.279278409, 47), (16.997996562, -31.3442136, 47), (17.857241012, -32.768726587, 47), (18.146490081, -34.362953291, 47), (17.857241012, -35.957179995, 47), (16.997996562, -37.381692982, 47), (15.598489603, -38.446628173, 47), (14.340397752, -38.766426588, 47), (11.606942776, -38.766426588, 47), (7.235758652, -38.766426588, 47), (0, -38.766426588, 47), (-7.235758652, -38.766426588, 47), (-11.606942776, -38.766426588, 47), (-14.340397752, -38.766426588, 47), (-15.598489603, -38.446628173, 47), (-16.997996562, -37.381692982, 47), (-17.857241012, -35.957179995, 47), (-18.146490081, -34.362953291, 47), (-17.857241012, -32.768726587, 47), (-16.997996562, -31.3442136, 47), (-15.598489603, -30.279278409, 47), (-14.340397752, -29.959479994, 47), (-13.646593818, -29.959479994, 47)], [0, 0, 0, 0, 0.074390756, 0.148781511, 0.223172267, 0.297563023, 0.297563023, 0.322867645, 0.348172267, 0.373476889, 0.398781511, 0.424086134, 0.449390756, 0.474695378, 0.5, 0.5, 0.574390756, 0.648781511, 0.723172267, 0.797563023, 0.797563023, 0.822867645, 0.848172267, 0.873476889, 0.898781511, 0.924086134, 0.949390756, 0.974695378, 1, 1, 1, 1], 3),
    ]
    lissage2_2 = Solid(Shell([*[Face.make_surface_from_curves(lissage2_2_from[k], lissage2_2_to[k]) for k in range(1)], Face(Wire(lissage2_2_from)), Face(Wire(lissage2_2_to))]))
    add(lissage2_2)


solid = part_2.part
